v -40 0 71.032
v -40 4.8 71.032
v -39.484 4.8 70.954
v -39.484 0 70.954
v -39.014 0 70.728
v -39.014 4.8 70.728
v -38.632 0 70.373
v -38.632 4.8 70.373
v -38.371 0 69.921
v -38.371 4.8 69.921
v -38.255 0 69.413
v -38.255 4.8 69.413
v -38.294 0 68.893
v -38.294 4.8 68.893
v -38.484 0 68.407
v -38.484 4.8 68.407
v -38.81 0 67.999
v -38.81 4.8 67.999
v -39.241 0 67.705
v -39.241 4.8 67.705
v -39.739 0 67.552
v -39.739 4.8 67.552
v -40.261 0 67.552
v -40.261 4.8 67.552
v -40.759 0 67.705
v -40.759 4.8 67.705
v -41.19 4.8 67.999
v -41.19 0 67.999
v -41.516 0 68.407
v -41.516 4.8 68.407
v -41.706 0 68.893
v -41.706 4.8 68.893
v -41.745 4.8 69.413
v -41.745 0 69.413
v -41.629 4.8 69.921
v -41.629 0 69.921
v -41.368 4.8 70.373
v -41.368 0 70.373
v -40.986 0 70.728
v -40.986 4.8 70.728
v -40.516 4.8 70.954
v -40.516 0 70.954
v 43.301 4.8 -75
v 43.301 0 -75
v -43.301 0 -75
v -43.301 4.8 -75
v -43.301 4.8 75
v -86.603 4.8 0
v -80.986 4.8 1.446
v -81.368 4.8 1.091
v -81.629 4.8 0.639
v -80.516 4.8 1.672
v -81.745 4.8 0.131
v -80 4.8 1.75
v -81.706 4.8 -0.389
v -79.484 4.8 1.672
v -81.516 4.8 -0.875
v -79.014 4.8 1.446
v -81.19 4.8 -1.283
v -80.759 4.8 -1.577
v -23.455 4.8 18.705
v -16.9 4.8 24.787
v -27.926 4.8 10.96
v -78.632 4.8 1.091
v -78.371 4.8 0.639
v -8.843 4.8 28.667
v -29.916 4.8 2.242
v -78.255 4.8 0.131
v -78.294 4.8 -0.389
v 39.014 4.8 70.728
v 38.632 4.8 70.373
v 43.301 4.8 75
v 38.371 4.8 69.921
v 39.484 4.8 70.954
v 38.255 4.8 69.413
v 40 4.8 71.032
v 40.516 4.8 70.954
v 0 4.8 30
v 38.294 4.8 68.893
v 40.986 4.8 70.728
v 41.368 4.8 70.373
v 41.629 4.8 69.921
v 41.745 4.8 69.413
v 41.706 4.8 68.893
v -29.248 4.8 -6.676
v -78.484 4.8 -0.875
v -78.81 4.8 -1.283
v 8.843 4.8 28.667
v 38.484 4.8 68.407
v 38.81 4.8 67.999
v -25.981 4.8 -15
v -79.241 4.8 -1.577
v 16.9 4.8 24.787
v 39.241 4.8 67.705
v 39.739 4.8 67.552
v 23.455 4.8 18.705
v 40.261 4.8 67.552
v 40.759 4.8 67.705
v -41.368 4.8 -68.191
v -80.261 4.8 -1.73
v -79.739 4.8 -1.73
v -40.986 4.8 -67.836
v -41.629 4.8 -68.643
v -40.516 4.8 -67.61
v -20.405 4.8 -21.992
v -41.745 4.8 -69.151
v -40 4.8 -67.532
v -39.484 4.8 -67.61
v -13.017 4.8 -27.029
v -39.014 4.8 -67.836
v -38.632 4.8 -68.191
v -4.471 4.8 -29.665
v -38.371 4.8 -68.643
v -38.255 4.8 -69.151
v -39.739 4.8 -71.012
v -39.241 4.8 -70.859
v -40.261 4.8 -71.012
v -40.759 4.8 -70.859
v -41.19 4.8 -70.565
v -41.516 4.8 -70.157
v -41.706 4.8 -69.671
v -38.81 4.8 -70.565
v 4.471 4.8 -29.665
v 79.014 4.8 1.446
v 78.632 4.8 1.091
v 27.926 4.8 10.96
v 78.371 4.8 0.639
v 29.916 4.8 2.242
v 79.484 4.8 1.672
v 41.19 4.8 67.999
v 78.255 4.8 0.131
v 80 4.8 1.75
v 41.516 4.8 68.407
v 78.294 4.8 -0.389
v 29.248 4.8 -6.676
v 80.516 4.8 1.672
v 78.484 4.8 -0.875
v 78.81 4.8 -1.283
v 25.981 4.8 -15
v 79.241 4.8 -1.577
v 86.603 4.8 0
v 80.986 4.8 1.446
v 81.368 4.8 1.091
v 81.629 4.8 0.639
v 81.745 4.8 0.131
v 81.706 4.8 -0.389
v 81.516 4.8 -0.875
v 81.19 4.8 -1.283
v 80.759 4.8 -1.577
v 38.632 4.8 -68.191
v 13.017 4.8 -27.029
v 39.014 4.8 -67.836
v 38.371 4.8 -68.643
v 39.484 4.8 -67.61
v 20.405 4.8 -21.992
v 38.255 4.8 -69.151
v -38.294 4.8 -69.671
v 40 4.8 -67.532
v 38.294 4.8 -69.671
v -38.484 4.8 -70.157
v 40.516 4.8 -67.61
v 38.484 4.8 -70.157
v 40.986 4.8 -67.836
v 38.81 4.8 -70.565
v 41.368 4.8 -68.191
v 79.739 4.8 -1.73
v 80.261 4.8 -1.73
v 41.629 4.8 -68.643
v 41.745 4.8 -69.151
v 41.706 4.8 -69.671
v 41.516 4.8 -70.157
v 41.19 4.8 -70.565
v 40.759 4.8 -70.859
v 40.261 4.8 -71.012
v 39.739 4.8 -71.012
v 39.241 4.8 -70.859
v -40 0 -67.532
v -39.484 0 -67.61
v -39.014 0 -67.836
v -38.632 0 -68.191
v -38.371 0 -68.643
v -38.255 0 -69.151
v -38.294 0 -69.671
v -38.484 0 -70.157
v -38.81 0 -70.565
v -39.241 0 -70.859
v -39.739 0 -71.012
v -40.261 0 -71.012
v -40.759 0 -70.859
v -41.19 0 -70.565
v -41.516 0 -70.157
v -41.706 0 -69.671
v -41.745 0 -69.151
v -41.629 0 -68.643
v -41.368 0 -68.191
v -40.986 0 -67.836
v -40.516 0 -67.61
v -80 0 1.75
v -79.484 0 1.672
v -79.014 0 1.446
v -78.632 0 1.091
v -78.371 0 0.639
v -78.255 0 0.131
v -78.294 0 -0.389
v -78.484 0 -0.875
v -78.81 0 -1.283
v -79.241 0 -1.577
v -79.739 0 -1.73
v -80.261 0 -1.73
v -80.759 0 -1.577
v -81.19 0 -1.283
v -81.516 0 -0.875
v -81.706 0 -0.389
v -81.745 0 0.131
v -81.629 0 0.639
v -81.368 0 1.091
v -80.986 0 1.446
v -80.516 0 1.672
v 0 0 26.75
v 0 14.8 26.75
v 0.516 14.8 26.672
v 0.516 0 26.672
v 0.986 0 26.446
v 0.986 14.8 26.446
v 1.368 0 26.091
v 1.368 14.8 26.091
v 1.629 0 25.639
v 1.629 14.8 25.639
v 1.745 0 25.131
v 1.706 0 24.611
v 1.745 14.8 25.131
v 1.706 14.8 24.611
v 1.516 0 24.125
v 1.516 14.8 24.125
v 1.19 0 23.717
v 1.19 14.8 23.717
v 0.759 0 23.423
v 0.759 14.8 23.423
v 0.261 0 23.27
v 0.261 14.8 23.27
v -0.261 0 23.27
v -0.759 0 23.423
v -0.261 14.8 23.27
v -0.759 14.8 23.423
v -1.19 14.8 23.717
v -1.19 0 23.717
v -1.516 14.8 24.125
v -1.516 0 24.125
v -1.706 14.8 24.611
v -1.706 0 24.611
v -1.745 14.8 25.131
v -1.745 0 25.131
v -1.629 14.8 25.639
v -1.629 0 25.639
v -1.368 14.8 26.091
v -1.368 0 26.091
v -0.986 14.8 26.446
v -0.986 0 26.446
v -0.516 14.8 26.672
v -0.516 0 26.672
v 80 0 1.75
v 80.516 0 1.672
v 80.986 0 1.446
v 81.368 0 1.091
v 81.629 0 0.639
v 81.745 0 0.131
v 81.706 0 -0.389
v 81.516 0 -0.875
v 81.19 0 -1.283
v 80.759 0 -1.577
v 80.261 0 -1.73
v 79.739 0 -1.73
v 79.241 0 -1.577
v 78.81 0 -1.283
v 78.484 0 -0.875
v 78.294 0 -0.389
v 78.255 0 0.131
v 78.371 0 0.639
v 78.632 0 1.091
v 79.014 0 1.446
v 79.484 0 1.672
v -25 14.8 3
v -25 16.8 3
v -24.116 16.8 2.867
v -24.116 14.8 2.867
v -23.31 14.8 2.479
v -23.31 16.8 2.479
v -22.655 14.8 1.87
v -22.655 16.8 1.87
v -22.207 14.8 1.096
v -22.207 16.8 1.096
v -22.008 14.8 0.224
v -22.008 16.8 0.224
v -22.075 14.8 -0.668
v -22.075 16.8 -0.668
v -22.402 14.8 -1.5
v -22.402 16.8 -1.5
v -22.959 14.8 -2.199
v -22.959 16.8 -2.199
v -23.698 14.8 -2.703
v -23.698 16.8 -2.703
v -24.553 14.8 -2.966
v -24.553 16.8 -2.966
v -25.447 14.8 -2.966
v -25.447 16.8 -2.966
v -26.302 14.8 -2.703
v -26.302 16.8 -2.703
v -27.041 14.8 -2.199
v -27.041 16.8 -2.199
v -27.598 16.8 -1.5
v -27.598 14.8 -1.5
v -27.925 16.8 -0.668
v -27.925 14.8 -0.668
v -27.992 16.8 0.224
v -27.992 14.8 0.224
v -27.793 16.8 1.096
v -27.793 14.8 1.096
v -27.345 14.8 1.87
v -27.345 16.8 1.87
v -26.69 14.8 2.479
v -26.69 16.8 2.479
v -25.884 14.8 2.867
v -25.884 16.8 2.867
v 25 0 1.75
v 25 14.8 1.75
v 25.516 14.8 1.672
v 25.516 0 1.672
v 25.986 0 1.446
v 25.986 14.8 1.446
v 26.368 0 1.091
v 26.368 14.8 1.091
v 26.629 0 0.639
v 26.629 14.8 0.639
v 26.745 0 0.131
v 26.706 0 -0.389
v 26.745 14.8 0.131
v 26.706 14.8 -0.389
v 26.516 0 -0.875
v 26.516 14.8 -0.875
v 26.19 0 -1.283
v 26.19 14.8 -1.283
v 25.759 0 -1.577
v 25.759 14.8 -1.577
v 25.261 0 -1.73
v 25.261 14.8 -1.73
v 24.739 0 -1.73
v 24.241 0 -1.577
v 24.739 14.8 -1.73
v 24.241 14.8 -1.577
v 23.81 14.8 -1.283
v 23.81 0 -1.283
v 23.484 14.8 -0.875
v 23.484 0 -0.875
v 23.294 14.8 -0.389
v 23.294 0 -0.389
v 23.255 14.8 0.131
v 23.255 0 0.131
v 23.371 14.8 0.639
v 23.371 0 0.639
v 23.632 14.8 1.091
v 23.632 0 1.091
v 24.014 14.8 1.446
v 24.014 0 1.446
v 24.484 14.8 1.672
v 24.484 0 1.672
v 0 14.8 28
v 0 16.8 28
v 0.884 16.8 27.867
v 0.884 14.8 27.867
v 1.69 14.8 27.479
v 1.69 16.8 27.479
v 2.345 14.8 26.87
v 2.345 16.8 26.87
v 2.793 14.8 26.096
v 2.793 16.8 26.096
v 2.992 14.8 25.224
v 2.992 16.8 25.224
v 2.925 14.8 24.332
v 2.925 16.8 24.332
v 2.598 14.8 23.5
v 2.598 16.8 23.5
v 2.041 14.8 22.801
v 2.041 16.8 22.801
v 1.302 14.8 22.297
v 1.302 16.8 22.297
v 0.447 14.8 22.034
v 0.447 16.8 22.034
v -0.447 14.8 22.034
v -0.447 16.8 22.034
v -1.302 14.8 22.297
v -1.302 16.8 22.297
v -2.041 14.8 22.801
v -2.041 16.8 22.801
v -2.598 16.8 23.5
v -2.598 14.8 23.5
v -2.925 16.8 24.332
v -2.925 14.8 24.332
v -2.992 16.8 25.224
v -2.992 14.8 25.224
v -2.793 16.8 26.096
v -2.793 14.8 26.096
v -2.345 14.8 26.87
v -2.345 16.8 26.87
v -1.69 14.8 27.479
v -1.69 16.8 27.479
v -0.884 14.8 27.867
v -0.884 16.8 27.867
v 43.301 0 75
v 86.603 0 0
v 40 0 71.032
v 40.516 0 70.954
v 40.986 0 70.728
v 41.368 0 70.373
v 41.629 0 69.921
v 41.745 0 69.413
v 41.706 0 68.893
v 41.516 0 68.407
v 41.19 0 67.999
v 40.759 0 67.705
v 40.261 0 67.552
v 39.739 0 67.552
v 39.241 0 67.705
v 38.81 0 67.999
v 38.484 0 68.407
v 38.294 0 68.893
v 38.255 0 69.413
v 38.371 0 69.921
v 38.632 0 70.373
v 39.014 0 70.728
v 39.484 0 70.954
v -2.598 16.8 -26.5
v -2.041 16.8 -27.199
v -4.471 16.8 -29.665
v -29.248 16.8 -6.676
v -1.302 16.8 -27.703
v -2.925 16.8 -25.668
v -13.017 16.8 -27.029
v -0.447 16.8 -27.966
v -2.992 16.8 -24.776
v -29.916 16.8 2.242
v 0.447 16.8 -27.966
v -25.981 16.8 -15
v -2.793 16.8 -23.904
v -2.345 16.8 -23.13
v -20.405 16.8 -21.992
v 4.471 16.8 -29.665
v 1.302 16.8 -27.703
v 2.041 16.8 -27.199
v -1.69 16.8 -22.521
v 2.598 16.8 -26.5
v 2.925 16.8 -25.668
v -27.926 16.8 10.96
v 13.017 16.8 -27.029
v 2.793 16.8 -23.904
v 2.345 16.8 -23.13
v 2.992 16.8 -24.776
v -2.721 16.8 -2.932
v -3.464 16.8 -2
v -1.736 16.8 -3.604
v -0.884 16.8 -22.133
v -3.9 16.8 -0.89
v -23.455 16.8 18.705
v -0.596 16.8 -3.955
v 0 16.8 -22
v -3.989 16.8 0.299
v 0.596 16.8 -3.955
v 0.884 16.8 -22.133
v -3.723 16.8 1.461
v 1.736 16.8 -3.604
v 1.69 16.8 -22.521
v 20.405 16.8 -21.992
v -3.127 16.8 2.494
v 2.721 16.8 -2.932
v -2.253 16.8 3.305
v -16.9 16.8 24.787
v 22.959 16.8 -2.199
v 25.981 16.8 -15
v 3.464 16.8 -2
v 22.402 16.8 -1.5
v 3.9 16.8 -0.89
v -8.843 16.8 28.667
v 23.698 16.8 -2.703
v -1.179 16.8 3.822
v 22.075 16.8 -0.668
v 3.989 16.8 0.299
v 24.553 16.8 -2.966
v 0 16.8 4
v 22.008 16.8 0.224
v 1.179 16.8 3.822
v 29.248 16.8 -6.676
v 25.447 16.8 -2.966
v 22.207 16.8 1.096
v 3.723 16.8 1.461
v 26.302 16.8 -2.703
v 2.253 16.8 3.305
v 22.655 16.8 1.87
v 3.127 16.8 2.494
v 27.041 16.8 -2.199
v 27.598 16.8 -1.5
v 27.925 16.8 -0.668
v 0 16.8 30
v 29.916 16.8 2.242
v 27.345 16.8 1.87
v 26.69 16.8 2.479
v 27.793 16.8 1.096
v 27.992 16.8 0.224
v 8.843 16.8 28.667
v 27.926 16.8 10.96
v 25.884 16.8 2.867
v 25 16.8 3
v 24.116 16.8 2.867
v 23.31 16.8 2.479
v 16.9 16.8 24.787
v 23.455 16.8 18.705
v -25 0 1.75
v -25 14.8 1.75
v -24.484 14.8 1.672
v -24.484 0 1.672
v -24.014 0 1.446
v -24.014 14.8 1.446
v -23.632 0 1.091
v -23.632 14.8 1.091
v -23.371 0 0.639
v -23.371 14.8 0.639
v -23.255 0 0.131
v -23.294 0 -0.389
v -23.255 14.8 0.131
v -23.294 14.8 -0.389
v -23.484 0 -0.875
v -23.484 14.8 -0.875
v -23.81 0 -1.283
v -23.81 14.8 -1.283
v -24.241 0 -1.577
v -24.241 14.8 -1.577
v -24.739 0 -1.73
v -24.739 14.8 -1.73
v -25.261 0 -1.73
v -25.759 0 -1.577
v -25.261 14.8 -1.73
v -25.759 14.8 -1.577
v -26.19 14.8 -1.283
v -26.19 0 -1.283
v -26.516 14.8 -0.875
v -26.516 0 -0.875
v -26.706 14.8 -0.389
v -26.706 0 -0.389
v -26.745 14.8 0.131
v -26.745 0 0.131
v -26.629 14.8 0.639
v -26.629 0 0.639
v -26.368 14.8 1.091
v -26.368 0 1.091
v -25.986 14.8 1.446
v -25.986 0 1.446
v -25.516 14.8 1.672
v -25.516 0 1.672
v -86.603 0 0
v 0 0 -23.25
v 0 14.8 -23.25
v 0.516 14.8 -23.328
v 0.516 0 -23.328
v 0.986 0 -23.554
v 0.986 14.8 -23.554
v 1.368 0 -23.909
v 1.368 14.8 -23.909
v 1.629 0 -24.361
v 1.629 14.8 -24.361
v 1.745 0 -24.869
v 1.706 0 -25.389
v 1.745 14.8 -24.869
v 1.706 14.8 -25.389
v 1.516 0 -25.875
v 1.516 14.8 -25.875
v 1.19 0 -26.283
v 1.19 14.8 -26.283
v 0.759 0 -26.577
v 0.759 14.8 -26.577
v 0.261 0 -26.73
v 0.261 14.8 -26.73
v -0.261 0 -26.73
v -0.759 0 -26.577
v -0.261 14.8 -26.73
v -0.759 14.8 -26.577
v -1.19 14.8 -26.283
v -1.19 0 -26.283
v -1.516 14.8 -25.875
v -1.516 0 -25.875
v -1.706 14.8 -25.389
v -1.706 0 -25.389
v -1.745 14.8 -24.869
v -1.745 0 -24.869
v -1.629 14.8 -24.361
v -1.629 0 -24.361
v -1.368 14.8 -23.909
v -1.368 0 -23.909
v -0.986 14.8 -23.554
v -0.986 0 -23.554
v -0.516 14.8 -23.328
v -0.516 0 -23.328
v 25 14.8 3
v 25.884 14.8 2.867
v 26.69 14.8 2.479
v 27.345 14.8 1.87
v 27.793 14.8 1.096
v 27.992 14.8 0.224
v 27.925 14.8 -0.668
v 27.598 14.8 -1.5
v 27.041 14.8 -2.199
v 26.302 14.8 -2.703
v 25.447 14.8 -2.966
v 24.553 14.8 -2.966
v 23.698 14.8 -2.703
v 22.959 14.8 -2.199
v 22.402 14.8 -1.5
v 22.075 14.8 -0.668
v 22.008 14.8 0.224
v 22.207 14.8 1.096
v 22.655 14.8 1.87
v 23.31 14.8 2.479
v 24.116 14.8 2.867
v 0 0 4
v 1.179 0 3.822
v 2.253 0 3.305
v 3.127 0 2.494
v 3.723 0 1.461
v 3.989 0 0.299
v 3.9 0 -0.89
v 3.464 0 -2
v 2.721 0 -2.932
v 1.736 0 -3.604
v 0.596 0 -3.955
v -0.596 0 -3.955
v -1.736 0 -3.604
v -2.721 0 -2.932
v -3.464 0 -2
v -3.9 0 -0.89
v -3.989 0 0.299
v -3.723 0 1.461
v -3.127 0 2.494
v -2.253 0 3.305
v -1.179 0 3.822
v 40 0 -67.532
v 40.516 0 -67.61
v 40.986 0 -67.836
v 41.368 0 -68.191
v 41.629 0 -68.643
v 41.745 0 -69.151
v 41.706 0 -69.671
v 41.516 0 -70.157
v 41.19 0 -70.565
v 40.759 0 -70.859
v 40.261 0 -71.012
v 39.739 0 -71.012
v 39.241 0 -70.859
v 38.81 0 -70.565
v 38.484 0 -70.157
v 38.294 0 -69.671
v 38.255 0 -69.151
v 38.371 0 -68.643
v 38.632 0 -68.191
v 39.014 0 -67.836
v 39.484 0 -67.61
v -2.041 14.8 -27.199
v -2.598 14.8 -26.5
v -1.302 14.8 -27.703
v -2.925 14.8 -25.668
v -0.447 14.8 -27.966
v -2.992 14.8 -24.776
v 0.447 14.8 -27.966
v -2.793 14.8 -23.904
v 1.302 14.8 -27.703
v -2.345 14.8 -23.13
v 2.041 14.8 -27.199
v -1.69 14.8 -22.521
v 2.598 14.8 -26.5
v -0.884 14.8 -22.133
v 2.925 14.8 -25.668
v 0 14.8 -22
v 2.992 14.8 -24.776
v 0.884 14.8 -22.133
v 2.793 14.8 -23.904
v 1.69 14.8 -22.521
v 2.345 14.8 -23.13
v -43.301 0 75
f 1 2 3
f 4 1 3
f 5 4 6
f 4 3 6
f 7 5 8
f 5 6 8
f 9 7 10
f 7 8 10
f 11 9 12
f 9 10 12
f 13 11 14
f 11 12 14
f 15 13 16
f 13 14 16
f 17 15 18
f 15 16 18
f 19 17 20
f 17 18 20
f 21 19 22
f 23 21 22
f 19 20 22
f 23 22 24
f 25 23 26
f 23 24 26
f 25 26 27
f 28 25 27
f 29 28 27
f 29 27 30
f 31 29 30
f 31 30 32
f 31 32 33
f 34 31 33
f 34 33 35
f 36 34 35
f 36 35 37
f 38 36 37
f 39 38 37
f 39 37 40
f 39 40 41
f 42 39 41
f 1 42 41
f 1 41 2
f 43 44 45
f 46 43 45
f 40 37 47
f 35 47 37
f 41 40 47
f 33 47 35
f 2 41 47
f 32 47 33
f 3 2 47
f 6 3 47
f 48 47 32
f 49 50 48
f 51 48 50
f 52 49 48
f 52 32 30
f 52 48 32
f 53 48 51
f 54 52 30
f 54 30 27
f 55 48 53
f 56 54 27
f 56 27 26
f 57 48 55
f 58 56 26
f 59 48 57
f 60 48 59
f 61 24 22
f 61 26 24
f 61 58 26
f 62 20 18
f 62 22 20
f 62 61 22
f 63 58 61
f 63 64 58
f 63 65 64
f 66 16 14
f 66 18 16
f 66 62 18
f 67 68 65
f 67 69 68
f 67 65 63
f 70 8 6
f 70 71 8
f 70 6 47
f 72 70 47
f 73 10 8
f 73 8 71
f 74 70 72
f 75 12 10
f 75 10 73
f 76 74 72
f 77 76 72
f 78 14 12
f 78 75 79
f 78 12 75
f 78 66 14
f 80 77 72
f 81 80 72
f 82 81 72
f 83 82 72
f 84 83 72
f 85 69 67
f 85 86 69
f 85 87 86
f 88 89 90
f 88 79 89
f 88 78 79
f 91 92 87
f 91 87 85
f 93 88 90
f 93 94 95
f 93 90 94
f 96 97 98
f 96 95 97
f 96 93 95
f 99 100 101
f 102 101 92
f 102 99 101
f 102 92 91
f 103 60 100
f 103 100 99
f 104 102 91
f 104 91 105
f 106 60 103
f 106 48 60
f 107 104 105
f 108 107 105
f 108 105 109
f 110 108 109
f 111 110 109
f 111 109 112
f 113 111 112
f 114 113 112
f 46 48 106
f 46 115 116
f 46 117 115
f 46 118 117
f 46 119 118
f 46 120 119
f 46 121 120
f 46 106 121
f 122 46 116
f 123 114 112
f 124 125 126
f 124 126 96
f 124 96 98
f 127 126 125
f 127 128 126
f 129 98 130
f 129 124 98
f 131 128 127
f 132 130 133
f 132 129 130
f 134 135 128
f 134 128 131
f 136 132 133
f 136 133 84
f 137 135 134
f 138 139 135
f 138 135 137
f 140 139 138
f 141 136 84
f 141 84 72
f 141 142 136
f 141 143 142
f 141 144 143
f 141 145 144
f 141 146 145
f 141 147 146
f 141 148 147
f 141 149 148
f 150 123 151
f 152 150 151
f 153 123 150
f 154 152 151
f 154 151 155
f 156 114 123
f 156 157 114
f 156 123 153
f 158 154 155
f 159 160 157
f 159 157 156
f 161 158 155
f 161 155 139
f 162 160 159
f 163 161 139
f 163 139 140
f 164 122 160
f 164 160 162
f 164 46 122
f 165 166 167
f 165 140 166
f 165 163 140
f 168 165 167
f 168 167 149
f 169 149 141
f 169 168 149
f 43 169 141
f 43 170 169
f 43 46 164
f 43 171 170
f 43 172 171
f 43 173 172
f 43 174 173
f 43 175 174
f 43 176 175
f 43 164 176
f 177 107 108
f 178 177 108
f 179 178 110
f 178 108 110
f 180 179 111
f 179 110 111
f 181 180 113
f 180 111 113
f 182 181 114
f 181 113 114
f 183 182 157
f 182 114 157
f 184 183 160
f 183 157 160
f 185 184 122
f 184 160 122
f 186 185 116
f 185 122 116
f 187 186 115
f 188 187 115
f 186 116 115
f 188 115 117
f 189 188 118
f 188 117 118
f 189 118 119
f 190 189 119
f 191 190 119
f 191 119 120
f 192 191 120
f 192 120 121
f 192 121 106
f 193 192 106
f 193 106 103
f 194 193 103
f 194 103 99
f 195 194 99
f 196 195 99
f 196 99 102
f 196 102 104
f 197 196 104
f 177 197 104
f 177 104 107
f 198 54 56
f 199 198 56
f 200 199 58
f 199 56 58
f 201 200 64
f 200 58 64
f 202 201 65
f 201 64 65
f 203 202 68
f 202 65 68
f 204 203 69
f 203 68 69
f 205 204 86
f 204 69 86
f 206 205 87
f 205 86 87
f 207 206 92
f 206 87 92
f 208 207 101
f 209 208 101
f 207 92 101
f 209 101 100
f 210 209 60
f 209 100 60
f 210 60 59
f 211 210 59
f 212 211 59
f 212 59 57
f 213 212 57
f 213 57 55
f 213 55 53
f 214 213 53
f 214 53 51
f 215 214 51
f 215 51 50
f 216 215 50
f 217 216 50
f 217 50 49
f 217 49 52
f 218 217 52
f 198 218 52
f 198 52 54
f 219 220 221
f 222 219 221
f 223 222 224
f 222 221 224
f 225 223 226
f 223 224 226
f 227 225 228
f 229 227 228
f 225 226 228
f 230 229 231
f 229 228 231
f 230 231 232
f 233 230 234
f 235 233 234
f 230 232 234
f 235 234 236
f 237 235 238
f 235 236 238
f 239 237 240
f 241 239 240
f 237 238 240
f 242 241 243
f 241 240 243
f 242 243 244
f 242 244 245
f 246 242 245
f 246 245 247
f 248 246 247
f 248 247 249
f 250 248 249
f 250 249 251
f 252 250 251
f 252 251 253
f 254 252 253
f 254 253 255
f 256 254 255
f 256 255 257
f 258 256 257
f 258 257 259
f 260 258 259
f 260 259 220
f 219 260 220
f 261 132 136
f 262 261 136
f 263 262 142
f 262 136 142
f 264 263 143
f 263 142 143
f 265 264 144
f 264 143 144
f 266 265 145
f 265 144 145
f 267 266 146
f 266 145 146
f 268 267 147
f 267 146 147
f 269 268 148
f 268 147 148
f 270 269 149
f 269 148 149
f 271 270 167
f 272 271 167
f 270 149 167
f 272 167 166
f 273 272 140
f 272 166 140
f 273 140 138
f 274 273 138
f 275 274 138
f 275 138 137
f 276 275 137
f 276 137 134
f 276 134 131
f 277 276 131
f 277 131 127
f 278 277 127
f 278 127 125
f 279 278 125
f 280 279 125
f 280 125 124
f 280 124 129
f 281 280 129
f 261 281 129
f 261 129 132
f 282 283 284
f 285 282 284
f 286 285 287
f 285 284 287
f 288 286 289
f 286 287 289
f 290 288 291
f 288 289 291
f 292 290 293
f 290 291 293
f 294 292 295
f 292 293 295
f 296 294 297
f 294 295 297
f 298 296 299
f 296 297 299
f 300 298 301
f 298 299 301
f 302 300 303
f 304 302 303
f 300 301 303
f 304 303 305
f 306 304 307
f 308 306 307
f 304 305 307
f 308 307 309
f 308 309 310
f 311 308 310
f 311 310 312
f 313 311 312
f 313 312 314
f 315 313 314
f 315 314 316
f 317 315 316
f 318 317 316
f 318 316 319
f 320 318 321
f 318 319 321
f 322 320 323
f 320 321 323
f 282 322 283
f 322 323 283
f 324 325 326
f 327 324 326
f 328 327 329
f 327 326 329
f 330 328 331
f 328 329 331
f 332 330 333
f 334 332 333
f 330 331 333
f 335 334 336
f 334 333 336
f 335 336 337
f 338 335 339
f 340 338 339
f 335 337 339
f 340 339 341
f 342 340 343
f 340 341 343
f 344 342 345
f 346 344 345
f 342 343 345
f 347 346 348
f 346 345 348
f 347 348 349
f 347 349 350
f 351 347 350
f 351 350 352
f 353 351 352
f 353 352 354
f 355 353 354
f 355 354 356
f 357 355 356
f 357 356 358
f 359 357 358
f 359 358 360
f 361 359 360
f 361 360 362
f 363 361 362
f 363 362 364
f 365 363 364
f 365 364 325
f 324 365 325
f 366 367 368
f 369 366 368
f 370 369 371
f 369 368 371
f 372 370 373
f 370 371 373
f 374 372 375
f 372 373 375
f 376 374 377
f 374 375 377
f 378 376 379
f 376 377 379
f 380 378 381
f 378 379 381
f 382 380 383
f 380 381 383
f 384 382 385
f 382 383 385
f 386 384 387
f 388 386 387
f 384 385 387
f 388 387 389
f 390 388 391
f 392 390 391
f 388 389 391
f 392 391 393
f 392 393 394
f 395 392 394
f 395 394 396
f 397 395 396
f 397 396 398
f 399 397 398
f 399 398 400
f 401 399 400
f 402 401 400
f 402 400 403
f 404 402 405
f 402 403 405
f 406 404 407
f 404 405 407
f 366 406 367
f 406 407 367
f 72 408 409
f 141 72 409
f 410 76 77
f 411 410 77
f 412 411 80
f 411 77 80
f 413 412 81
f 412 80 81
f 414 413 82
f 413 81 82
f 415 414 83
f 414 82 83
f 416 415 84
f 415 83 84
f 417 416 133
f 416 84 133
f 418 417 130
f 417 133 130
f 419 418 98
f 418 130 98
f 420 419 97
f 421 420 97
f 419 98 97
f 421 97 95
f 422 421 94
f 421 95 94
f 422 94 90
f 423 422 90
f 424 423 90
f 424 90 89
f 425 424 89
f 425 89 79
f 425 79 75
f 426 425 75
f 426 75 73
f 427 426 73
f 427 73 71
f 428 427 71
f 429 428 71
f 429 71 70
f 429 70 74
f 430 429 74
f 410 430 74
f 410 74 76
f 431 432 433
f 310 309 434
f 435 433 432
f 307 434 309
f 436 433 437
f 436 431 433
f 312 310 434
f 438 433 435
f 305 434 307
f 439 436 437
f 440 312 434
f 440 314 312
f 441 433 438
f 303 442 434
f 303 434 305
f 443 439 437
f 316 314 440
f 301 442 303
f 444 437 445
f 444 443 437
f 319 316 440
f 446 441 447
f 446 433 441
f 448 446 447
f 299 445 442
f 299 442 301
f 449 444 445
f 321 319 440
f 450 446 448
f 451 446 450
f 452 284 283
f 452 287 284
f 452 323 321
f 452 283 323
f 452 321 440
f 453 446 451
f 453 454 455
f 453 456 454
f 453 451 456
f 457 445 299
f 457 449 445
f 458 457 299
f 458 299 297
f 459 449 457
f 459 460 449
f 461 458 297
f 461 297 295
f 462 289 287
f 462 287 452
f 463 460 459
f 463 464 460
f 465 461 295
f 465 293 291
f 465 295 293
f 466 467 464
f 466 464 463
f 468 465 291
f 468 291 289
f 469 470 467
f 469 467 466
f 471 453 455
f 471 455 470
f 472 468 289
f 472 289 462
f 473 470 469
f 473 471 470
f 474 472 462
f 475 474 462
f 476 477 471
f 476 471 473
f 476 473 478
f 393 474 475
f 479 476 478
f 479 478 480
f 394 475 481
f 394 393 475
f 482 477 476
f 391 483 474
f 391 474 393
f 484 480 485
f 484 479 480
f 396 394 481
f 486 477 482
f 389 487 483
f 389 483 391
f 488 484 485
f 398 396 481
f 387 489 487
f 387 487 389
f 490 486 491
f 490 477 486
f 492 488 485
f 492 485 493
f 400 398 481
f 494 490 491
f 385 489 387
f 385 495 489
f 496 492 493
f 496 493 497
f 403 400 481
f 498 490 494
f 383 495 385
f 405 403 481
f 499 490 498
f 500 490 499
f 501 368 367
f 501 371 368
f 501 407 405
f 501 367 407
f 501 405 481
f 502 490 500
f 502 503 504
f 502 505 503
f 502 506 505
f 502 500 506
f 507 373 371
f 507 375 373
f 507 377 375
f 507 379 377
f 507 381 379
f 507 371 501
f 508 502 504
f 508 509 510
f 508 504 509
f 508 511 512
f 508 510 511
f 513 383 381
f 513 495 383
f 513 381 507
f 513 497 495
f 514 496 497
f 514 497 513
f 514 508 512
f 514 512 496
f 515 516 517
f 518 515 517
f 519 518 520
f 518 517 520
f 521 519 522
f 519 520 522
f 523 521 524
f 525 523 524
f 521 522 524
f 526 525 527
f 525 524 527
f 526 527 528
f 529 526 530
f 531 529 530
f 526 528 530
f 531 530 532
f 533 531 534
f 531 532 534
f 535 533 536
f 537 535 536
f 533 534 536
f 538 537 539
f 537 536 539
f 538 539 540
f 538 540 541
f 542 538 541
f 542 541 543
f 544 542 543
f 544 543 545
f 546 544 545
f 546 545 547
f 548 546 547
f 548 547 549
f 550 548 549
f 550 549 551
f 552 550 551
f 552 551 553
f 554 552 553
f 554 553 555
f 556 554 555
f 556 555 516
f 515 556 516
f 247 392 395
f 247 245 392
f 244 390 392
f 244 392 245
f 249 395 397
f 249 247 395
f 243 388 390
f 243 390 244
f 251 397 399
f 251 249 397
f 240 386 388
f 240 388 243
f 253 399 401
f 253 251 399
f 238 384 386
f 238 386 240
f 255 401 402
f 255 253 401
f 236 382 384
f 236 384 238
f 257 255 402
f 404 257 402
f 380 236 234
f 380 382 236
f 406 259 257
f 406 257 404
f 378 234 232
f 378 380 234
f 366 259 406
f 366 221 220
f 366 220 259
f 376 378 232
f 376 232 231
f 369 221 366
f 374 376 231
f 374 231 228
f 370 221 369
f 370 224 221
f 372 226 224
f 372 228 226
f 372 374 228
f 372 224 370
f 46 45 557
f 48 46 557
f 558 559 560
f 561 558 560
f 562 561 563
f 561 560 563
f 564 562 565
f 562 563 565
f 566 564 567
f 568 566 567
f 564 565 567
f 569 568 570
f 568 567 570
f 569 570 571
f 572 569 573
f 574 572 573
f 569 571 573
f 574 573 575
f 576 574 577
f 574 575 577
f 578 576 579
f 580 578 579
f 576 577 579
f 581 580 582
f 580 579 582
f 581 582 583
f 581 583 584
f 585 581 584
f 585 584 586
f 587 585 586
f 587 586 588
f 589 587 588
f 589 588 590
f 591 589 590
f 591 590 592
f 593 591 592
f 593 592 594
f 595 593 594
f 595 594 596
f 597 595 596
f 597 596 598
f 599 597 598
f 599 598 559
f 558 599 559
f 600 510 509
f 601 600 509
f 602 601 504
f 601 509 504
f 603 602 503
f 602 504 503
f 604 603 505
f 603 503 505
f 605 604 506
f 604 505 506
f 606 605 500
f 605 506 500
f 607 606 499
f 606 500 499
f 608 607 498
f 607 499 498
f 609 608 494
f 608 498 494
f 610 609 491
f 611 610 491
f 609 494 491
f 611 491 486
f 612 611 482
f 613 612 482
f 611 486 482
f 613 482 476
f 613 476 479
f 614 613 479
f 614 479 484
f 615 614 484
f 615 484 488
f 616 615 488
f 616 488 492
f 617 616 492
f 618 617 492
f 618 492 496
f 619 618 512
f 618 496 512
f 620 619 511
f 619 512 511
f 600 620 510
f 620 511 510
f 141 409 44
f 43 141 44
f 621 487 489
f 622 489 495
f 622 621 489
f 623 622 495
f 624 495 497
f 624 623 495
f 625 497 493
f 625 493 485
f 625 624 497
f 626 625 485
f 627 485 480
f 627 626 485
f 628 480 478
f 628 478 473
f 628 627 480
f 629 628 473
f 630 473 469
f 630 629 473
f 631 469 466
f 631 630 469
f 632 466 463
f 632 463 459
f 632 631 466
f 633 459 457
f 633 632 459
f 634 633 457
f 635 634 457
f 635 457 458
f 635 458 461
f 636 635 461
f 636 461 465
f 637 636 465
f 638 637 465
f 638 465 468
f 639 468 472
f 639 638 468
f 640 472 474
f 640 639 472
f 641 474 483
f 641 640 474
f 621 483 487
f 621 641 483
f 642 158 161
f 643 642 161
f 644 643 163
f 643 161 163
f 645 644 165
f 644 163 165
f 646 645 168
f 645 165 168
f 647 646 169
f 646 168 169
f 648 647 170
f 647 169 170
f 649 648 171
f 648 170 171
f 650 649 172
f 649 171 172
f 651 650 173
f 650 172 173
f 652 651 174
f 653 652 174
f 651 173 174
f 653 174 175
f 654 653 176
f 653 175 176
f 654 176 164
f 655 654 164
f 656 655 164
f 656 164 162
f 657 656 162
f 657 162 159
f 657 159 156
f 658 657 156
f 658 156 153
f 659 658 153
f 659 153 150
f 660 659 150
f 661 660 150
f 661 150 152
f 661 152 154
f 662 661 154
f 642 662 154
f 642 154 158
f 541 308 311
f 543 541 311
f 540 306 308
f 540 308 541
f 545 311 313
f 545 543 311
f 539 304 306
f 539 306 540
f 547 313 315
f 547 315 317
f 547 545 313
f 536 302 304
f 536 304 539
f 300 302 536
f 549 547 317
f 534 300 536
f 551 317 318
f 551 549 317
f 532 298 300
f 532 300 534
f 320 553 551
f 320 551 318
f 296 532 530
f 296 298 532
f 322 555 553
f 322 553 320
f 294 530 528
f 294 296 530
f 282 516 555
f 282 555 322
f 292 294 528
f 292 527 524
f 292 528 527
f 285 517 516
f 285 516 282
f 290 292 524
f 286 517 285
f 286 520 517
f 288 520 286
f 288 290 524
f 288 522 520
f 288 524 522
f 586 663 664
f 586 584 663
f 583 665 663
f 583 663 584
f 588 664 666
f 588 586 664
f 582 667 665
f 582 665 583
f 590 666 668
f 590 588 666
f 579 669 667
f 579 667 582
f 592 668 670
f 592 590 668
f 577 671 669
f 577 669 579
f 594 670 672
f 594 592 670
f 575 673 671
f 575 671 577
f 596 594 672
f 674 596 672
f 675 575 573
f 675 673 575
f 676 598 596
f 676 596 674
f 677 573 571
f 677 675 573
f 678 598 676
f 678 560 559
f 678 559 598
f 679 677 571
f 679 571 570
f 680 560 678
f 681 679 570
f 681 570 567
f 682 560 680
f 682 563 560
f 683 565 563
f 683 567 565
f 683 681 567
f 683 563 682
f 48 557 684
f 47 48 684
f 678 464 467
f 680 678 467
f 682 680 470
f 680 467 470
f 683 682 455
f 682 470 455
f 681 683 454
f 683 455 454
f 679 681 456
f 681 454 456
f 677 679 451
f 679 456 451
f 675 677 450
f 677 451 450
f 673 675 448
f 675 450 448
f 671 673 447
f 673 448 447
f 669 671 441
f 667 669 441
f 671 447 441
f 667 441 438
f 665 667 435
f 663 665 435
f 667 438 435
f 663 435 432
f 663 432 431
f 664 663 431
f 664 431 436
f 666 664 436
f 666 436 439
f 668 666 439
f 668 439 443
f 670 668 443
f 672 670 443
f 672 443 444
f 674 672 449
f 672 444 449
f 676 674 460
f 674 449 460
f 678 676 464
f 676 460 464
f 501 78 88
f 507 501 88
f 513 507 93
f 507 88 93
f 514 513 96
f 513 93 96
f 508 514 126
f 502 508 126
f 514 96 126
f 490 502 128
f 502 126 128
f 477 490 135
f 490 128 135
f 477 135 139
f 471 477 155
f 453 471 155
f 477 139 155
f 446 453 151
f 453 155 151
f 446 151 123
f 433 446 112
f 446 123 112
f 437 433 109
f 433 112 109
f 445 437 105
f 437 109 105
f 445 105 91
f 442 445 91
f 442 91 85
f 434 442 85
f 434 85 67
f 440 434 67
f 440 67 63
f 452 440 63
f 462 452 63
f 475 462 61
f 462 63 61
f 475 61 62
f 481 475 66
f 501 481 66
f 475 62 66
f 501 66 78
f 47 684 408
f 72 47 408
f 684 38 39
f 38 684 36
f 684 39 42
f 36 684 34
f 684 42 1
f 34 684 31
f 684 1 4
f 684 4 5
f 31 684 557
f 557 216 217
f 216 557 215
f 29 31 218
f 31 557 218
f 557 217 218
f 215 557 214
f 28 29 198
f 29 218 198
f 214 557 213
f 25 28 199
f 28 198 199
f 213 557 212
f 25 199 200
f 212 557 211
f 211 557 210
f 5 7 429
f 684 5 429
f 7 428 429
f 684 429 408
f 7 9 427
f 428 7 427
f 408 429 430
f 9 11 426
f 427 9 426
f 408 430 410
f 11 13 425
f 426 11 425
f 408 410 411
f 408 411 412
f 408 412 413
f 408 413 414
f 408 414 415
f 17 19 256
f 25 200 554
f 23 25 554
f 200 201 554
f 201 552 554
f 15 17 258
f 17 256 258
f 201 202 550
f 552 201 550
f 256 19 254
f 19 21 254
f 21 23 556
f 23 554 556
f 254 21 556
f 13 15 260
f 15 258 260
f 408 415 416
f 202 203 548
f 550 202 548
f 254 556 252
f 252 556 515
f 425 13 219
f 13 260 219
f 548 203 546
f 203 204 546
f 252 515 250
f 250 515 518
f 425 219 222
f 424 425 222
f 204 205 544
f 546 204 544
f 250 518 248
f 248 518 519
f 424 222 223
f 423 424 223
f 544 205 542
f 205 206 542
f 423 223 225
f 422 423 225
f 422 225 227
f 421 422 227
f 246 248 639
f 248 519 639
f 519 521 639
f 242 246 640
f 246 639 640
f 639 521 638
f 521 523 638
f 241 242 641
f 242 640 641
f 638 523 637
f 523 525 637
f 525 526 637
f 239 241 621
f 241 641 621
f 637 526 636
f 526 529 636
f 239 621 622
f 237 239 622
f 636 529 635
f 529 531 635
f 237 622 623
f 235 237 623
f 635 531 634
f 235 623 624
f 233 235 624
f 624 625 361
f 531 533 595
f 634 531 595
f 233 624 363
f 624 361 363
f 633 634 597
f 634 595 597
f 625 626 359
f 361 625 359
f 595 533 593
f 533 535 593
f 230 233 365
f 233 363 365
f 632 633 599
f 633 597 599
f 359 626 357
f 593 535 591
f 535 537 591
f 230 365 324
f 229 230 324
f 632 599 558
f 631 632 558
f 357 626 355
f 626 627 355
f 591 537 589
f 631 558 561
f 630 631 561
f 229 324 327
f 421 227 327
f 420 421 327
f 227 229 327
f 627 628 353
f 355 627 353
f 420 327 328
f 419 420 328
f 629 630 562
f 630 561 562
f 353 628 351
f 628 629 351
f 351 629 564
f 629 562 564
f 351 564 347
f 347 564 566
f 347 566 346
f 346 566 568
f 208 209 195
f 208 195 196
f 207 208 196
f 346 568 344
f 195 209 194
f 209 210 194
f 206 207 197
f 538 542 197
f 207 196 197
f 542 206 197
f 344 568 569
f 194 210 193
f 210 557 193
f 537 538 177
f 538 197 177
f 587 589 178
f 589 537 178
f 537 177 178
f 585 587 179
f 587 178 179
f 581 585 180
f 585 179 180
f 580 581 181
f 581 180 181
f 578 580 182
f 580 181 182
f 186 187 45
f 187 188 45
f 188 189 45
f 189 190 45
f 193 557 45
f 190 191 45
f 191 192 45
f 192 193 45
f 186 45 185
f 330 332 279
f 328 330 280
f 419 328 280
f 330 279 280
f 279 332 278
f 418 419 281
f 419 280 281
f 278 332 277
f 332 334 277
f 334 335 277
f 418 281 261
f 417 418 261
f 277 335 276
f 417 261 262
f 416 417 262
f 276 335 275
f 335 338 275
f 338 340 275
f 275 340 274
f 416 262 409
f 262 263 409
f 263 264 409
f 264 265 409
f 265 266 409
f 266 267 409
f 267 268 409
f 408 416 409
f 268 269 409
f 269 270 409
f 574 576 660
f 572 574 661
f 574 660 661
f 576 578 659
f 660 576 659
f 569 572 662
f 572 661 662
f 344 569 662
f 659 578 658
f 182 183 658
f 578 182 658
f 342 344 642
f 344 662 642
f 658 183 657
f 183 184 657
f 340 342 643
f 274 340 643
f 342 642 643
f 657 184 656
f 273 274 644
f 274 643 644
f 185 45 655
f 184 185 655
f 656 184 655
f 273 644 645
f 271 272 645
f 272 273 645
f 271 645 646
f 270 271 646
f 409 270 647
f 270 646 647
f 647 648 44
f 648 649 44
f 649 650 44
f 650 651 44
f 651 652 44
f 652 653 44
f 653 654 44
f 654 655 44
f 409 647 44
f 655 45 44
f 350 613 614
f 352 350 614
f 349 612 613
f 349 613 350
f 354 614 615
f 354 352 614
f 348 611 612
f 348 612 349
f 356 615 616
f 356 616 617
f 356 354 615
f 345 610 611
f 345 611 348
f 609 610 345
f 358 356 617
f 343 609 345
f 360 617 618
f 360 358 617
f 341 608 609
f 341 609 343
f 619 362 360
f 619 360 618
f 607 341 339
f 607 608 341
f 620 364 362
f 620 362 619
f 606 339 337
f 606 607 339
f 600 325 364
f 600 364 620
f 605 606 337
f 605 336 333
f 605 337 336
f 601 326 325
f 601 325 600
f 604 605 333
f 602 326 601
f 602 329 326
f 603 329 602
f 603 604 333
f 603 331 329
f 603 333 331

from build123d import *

# Parameters (mm, degrees)
SKETCH1_R           = 4
BOSS_EXTRUDE2_DEPTH = 4.8
SKETCH2_R           = 30
SKETCH2_R_2         = 4
BOSS_EXTRUDE3_DEPTH = 12
SKETCH3_R           = 1.75
CUT_EXTRUDE1_DEPTH  = 16.8
SKETCH4_R           = 3
CUT_EXTRUDE2_DEPTH  = 2


with BuildPart() as part:
    # Sketch1 → Boss-Extrude2 (new body)
    with BuildSketch(Plane(origin=(0, 0, 0), x_dir=(1, 0, 0), z_dir=(0, 1, 0))):
        Polygon((86.602540378, 0), (43.301270189, 75), (-43.301270189, 75), (-86.602540378, 0), (-43.301270189, -75), (43.301270189, -75), align=None)
        with Locations(Location((0, 0, 0), (0, 0, 270))):
            Circle(SKETCH1_R, mode=Mode.SUBTRACT)
    extrude(amount=BOSS_EXTRUDE2_DEPTH)

    # Sketch2 → Boss-Extrude3 (add)
    with BuildSketch(Plane(origin=(0, 4.8, 0), x_dir=(1, 0, 0), z_dir=(0, 1, 0))):
        with Locations(Location((0, 0, 0), (0, 0, 270))):
            Circle(SKETCH2_R)
        with Locations(Location((0, 0, 0), (0, 0, 270))):
            Circle(SKETCH2_R_2, mode=Mode.SUBTRACT)
    extrude(amount=BOSS_EXTRUDE3_DEPTH)

    # Sketch3 → Cut-Extrude1 (cut)
    with BuildSketch(Plane(origin=(0, 16.8, 0), x_dir=(1, 0, 0), z_dir=(0, 1, 0))):
        with Locations(Location((25, 0, 0), (0, 0, 270))):
            Circle(SKETCH3_R)
        with Locations(Location((0, -25, 0), (0, 0, 270))):
            Circle(SKETCH3_R)
        with Locations(Location((-25, 0, 0), (0, 0, 270))):
            Circle(SKETCH3_R)
        with Locations(Location((0, 25, 0), (0, 0, 270))):
            Circle(SKETCH3_R)
        with Locations(Location((40, 69.282032303, 0), (0, 0, 270))):
            Circle(SKETCH3_R)
        with Locations(Location((80, 0, 0), (0, 0, 270))):
            Circle(SKETCH3_R)
        with Locations(Location((40, -69.282032303, 0), (0, 0, 270))):
            Circle(SKETCH3_R)
        with Locations(Location((-40, -69.282032303, 0), (0, 0, 270))):
            Circle(SKETCH3_R)
        with Locations(Location((-80, 0, 0), (0, 0, 270))):
            Circle(SKETCH3_R)
        with Locations(Location((-40, 69.282032303, 0), (0, 0, 270))):
            Circle(SKETCH3_R)
    extrude(amount=-CUT_EXTRUDE1_DEPTH, mode=Mode.SUBTRACT)

    # Sketch4 → Cut-Extrude2 (cut)
    with BuildSketch(Plane(origin=(0, 16.8, 0), x_dir=(1, 0, 0), z_dir=(0, 1, 0))):
        with Locations(Location((0, 25, 0), (0, 0, 270))):
            Circle(SKETCH4_R)
        with Locations(Location((25, 0, 0), (0, 0, 270))):
            Circle(SKETCH4_R)
        with Locations(Location((0, -25, 0), (0, 0, 270))):
            Circle(SKETCH4_R)
        with Locations(Location((-25, 0, 0), (0, 0, 270))):
            Circle(SKETCH4_R)
    extrude(amount=-CUT_EXTRUDE2_DEPTH, mode=Mode.SUBTRACT)


solid = part.part
